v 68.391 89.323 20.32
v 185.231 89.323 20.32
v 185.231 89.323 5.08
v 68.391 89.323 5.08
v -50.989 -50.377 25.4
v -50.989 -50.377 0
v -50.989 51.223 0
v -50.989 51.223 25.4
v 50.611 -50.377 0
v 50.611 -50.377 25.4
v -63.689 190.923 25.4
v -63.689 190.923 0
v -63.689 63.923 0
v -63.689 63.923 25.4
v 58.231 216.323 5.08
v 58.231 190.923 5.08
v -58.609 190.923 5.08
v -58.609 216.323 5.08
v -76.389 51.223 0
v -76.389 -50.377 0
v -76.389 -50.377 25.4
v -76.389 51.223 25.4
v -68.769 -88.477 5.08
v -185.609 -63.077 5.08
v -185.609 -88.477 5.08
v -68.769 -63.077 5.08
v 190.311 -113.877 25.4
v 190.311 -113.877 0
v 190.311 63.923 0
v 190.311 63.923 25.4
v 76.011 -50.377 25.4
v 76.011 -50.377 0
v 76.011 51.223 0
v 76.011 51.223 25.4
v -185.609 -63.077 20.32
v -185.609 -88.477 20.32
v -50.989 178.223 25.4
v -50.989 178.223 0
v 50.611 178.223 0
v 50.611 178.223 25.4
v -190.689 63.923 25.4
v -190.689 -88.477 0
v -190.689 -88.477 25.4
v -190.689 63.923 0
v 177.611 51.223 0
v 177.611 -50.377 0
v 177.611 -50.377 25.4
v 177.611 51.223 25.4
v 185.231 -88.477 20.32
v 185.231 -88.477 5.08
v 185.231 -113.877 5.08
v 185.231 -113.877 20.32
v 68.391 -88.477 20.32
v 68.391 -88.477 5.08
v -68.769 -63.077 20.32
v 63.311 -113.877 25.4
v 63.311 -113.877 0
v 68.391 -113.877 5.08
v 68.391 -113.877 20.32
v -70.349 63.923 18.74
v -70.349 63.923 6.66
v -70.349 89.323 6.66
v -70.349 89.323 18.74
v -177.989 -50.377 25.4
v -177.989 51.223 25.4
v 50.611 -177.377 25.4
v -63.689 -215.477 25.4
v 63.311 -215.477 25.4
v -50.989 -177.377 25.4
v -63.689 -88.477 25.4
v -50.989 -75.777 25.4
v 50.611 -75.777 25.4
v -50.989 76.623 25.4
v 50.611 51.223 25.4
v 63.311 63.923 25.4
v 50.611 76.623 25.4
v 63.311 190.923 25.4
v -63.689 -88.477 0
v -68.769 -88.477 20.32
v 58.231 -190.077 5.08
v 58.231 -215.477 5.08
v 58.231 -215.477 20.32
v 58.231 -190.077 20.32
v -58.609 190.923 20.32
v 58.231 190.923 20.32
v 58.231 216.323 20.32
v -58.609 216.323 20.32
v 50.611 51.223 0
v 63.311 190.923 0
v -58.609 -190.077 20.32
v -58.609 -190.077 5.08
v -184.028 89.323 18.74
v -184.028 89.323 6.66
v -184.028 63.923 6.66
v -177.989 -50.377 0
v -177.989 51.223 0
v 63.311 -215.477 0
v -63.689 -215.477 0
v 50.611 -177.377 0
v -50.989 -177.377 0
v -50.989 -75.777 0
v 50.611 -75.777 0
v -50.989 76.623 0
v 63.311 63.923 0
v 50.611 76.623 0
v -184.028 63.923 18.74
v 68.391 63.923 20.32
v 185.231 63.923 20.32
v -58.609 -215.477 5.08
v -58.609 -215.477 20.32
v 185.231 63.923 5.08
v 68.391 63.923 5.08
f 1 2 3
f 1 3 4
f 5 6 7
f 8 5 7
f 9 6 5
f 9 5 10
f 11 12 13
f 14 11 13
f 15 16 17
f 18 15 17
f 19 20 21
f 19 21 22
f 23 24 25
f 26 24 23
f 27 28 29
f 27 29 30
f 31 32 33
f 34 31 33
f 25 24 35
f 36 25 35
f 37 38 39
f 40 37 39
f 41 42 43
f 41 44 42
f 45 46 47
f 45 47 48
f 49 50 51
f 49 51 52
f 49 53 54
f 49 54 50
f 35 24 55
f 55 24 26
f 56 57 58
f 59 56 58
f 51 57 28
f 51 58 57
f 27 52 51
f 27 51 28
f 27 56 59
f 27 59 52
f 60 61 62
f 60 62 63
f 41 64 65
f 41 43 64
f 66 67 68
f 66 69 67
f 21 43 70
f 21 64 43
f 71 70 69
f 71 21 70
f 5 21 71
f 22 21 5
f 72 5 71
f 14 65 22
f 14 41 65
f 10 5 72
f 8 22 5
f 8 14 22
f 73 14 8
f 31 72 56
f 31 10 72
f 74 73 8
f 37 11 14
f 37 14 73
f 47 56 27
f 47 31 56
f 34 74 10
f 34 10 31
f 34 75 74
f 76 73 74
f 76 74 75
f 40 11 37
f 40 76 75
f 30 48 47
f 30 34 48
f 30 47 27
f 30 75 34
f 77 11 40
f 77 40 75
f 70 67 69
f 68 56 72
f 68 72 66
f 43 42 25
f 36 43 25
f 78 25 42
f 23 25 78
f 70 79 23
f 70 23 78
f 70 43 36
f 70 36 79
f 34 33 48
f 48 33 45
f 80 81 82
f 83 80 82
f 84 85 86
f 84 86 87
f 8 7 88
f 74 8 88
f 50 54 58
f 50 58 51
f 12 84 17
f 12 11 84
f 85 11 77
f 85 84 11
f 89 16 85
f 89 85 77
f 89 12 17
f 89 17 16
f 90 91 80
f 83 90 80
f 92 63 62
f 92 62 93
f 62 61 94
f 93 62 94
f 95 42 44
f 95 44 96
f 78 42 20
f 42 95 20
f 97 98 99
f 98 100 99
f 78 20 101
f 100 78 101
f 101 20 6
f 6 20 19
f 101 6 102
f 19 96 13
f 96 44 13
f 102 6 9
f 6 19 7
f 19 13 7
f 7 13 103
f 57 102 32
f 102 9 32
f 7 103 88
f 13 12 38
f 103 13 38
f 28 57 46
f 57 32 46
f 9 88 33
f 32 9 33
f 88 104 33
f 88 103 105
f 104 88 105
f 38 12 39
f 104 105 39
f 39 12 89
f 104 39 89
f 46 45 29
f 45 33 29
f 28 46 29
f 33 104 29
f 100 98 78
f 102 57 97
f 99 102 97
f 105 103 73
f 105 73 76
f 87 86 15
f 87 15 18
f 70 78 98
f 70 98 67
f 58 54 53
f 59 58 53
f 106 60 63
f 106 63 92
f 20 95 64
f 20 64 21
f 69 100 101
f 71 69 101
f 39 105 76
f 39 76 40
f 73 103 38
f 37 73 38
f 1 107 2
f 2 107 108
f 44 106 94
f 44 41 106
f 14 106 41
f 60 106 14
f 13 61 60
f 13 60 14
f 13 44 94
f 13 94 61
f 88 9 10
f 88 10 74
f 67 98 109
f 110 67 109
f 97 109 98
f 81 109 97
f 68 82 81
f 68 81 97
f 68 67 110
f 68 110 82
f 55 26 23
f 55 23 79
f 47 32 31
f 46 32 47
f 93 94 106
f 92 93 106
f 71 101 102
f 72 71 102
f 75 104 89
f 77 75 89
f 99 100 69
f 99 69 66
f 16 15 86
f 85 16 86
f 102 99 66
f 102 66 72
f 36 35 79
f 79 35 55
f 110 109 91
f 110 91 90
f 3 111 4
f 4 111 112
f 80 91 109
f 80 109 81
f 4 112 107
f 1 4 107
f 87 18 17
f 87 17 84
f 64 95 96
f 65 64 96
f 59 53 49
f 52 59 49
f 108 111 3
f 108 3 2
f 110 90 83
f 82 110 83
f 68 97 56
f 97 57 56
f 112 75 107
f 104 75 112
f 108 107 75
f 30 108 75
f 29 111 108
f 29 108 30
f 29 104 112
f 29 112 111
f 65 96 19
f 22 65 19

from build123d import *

# Parameters (mm, degrees)
F0_W      = 127
F0_H      = 127
F0_W_2    = 101.6
F0_H_2    = 101.6
F1_DEPTH  = 25.4
F2_W      = 116.84
F2_H      = 15.24
F3_DEPTH  = 25.4
F5_W      = 113.6791649616
F5_H      = 12.0791649616
F6_DEPTH  = 25.4
F7_W      = 5.08
F7_H      = 15.24
F7_W_2    = 111.76
F8_DEPTH  = 25.4
F9_W      = 127
F9_H      = 25.4
F9_W_2    = 116.84
F9_H_2    = 15.24
F10_DEPTH = 25.4
F11_W     = 127
F11_H     = 25.4
F11_W_2   = 116.84
F11_H_2   = 15.24
F12_DEPTH = 25.4
F13_W     = 127
F13_H     = 25.4
F13_W_2   = 116.84
F13_H_2   = 15.24
F14_DEPTH = 25.4
F15_W     = 127
F15_H     = 25.4
F15_W_2   = 116.84
F15_H_2   = 15.24
F16_DEPTH = 25.4


with BuildPart() as f1:
    # F0 (on Top) → F1 (new body)
    with BuildSketch(Plane.XY):
        with Locations((-0.1885456222, 127.423350506)):
            Rectangle(F0_W, F0_H)
        with Locations((-0.1885456222, 127.423350506)):
            Rectangle(F0_W_2, F0_H_2, mode=Mode.SUBTRACT)
        with Locations((-0.1885456222, 0.423350506)):
            Rectangle(F0_W, F0_H)
        with Locations((-0.1885456222, 0.423350506)):
            Rectangle(F0_W_2, F0_H_2, mode=Mode.SUBTRACT)
        with Locations((-127.1885456222, 0.423350506)):
            Rectangle(F0_W, F0_H)
        with Locations((-127.1885456222, 0.423350506)):
            Rectangle(F0_W_2, F0_H_2, mode=Mode.SUBTRACT)
        with Locations((126.8114543778, 0.423350506)):
            Rectangle(F0_W, F0_H)
        with Locations((126.8114543778, 0.423350506)):
            Rectangle(F0_W_2, F0_H_2, mode=Mode.SUBTRACT)
        with Locations((-0.1885456222, -126.576649494)):
            Rectangle(F0_W, F0_H)
        with Locations((-0.1885456222, -126.576649494)):
            Rectangle(F0_W_2, F0_H_2, mode=Mode.SUBTRACT)
    extrude(amount=F1_DEPTH)

    # F2 (on face) → F3 (join)
    with BuildSketch(Plane(origin=(0, 190.923350506, 0), x_dir=(-1, 0, 0), z_dir=(0, 1, 0))):
        with Locations((0.1885456222, 12.7)):
            Rectangle(F2_W, F2_H)
    extrude(amount=F3_DEPTH)

    # F5 (on face) → F6 (join)
    with BuildSketch(Plane(origin=(0, 63.923350506, 0), x_dir=(-1, 0, 0), z_dir=(0, 1, 0))):
        with Locations((127.1885456222, 12.7)):
            Rectangle(F5_W, F5_H)
    extrude(amount=F6_DEPTH)

    # F7 (on face) → F8 (join)
    with BuildSketch(Plane(origin=(0, 63.923350506, 0), x_dir=(-1, 0, 0), z_dir=(0, 1, 0))):
        with Locations((-182.6914543778, 12.7)):
            Rectangle(F7_W, F7_H)
        with Locations((-124.2714543778, 12.7)):
            Rectangle(F7_W_2, F7_H)
    extrude(amount=F8_DEPTH)

    # F9 (on face) → F10 (join)
    with BuildSketch(Plane.XZ.offset(63.076649494)):
        with Locations((126.8114543778, 12.7)):
            Rectangle(F9_W, F9_H)
        with Locations((126.8114543778, 12.7)):
            Rectangle(F9_W_2, F9_H_2, mode=Mode.SUBTRACT)
        with Locations((126.8114543778, 12.7)):
            Rectangle(F9_W_2, F9_H_2)
    extrude(amount=F10_DEPTH)

    # F11 (on face) → F12 (join)
    with BuildSketch(Plane.XZ.offset(88.476649494)):
        with Locations((126.8114543778, 12.7)):
            Rectangle(F11_W, F11_H)
        with Locations((126.8114543778, 12.7)):
            Rectangle(F11_W_2, F11_H_2, mode=Mode.SUBTRACT)
    extrude(amount=F12_DEPTH)

    # F13 (on face) → F14 (join)
    with BuildSketch(Plane.XZ.offset(190.076649494)):
        with Locations((-0.1885456222, 12.7)):
            Rectangle(F13_W, F13_H)
        with Locations((-0.1885456222, 12.7)):
            Rectangle(F13_W_2, F13_H_2, mode=Mode.SUBTRACT)
    extrude(amount=F14_DEPTH)

    # F15 (on face) → F16 (join)
    with BuildSketch(Plane.XZ.offset(63.076649494)):
        with Locations((-127.1885456222, 12.7)):
            Rectangle(F15_W, F15_H)
        with Locations((-127.1885456222, 12.7)):
            Rectangle(F15_W_2, F15_H_2, mode=Mode.SUBTRACT)
    extrude(amount=F16_DEPTH)


solid = f1.part
